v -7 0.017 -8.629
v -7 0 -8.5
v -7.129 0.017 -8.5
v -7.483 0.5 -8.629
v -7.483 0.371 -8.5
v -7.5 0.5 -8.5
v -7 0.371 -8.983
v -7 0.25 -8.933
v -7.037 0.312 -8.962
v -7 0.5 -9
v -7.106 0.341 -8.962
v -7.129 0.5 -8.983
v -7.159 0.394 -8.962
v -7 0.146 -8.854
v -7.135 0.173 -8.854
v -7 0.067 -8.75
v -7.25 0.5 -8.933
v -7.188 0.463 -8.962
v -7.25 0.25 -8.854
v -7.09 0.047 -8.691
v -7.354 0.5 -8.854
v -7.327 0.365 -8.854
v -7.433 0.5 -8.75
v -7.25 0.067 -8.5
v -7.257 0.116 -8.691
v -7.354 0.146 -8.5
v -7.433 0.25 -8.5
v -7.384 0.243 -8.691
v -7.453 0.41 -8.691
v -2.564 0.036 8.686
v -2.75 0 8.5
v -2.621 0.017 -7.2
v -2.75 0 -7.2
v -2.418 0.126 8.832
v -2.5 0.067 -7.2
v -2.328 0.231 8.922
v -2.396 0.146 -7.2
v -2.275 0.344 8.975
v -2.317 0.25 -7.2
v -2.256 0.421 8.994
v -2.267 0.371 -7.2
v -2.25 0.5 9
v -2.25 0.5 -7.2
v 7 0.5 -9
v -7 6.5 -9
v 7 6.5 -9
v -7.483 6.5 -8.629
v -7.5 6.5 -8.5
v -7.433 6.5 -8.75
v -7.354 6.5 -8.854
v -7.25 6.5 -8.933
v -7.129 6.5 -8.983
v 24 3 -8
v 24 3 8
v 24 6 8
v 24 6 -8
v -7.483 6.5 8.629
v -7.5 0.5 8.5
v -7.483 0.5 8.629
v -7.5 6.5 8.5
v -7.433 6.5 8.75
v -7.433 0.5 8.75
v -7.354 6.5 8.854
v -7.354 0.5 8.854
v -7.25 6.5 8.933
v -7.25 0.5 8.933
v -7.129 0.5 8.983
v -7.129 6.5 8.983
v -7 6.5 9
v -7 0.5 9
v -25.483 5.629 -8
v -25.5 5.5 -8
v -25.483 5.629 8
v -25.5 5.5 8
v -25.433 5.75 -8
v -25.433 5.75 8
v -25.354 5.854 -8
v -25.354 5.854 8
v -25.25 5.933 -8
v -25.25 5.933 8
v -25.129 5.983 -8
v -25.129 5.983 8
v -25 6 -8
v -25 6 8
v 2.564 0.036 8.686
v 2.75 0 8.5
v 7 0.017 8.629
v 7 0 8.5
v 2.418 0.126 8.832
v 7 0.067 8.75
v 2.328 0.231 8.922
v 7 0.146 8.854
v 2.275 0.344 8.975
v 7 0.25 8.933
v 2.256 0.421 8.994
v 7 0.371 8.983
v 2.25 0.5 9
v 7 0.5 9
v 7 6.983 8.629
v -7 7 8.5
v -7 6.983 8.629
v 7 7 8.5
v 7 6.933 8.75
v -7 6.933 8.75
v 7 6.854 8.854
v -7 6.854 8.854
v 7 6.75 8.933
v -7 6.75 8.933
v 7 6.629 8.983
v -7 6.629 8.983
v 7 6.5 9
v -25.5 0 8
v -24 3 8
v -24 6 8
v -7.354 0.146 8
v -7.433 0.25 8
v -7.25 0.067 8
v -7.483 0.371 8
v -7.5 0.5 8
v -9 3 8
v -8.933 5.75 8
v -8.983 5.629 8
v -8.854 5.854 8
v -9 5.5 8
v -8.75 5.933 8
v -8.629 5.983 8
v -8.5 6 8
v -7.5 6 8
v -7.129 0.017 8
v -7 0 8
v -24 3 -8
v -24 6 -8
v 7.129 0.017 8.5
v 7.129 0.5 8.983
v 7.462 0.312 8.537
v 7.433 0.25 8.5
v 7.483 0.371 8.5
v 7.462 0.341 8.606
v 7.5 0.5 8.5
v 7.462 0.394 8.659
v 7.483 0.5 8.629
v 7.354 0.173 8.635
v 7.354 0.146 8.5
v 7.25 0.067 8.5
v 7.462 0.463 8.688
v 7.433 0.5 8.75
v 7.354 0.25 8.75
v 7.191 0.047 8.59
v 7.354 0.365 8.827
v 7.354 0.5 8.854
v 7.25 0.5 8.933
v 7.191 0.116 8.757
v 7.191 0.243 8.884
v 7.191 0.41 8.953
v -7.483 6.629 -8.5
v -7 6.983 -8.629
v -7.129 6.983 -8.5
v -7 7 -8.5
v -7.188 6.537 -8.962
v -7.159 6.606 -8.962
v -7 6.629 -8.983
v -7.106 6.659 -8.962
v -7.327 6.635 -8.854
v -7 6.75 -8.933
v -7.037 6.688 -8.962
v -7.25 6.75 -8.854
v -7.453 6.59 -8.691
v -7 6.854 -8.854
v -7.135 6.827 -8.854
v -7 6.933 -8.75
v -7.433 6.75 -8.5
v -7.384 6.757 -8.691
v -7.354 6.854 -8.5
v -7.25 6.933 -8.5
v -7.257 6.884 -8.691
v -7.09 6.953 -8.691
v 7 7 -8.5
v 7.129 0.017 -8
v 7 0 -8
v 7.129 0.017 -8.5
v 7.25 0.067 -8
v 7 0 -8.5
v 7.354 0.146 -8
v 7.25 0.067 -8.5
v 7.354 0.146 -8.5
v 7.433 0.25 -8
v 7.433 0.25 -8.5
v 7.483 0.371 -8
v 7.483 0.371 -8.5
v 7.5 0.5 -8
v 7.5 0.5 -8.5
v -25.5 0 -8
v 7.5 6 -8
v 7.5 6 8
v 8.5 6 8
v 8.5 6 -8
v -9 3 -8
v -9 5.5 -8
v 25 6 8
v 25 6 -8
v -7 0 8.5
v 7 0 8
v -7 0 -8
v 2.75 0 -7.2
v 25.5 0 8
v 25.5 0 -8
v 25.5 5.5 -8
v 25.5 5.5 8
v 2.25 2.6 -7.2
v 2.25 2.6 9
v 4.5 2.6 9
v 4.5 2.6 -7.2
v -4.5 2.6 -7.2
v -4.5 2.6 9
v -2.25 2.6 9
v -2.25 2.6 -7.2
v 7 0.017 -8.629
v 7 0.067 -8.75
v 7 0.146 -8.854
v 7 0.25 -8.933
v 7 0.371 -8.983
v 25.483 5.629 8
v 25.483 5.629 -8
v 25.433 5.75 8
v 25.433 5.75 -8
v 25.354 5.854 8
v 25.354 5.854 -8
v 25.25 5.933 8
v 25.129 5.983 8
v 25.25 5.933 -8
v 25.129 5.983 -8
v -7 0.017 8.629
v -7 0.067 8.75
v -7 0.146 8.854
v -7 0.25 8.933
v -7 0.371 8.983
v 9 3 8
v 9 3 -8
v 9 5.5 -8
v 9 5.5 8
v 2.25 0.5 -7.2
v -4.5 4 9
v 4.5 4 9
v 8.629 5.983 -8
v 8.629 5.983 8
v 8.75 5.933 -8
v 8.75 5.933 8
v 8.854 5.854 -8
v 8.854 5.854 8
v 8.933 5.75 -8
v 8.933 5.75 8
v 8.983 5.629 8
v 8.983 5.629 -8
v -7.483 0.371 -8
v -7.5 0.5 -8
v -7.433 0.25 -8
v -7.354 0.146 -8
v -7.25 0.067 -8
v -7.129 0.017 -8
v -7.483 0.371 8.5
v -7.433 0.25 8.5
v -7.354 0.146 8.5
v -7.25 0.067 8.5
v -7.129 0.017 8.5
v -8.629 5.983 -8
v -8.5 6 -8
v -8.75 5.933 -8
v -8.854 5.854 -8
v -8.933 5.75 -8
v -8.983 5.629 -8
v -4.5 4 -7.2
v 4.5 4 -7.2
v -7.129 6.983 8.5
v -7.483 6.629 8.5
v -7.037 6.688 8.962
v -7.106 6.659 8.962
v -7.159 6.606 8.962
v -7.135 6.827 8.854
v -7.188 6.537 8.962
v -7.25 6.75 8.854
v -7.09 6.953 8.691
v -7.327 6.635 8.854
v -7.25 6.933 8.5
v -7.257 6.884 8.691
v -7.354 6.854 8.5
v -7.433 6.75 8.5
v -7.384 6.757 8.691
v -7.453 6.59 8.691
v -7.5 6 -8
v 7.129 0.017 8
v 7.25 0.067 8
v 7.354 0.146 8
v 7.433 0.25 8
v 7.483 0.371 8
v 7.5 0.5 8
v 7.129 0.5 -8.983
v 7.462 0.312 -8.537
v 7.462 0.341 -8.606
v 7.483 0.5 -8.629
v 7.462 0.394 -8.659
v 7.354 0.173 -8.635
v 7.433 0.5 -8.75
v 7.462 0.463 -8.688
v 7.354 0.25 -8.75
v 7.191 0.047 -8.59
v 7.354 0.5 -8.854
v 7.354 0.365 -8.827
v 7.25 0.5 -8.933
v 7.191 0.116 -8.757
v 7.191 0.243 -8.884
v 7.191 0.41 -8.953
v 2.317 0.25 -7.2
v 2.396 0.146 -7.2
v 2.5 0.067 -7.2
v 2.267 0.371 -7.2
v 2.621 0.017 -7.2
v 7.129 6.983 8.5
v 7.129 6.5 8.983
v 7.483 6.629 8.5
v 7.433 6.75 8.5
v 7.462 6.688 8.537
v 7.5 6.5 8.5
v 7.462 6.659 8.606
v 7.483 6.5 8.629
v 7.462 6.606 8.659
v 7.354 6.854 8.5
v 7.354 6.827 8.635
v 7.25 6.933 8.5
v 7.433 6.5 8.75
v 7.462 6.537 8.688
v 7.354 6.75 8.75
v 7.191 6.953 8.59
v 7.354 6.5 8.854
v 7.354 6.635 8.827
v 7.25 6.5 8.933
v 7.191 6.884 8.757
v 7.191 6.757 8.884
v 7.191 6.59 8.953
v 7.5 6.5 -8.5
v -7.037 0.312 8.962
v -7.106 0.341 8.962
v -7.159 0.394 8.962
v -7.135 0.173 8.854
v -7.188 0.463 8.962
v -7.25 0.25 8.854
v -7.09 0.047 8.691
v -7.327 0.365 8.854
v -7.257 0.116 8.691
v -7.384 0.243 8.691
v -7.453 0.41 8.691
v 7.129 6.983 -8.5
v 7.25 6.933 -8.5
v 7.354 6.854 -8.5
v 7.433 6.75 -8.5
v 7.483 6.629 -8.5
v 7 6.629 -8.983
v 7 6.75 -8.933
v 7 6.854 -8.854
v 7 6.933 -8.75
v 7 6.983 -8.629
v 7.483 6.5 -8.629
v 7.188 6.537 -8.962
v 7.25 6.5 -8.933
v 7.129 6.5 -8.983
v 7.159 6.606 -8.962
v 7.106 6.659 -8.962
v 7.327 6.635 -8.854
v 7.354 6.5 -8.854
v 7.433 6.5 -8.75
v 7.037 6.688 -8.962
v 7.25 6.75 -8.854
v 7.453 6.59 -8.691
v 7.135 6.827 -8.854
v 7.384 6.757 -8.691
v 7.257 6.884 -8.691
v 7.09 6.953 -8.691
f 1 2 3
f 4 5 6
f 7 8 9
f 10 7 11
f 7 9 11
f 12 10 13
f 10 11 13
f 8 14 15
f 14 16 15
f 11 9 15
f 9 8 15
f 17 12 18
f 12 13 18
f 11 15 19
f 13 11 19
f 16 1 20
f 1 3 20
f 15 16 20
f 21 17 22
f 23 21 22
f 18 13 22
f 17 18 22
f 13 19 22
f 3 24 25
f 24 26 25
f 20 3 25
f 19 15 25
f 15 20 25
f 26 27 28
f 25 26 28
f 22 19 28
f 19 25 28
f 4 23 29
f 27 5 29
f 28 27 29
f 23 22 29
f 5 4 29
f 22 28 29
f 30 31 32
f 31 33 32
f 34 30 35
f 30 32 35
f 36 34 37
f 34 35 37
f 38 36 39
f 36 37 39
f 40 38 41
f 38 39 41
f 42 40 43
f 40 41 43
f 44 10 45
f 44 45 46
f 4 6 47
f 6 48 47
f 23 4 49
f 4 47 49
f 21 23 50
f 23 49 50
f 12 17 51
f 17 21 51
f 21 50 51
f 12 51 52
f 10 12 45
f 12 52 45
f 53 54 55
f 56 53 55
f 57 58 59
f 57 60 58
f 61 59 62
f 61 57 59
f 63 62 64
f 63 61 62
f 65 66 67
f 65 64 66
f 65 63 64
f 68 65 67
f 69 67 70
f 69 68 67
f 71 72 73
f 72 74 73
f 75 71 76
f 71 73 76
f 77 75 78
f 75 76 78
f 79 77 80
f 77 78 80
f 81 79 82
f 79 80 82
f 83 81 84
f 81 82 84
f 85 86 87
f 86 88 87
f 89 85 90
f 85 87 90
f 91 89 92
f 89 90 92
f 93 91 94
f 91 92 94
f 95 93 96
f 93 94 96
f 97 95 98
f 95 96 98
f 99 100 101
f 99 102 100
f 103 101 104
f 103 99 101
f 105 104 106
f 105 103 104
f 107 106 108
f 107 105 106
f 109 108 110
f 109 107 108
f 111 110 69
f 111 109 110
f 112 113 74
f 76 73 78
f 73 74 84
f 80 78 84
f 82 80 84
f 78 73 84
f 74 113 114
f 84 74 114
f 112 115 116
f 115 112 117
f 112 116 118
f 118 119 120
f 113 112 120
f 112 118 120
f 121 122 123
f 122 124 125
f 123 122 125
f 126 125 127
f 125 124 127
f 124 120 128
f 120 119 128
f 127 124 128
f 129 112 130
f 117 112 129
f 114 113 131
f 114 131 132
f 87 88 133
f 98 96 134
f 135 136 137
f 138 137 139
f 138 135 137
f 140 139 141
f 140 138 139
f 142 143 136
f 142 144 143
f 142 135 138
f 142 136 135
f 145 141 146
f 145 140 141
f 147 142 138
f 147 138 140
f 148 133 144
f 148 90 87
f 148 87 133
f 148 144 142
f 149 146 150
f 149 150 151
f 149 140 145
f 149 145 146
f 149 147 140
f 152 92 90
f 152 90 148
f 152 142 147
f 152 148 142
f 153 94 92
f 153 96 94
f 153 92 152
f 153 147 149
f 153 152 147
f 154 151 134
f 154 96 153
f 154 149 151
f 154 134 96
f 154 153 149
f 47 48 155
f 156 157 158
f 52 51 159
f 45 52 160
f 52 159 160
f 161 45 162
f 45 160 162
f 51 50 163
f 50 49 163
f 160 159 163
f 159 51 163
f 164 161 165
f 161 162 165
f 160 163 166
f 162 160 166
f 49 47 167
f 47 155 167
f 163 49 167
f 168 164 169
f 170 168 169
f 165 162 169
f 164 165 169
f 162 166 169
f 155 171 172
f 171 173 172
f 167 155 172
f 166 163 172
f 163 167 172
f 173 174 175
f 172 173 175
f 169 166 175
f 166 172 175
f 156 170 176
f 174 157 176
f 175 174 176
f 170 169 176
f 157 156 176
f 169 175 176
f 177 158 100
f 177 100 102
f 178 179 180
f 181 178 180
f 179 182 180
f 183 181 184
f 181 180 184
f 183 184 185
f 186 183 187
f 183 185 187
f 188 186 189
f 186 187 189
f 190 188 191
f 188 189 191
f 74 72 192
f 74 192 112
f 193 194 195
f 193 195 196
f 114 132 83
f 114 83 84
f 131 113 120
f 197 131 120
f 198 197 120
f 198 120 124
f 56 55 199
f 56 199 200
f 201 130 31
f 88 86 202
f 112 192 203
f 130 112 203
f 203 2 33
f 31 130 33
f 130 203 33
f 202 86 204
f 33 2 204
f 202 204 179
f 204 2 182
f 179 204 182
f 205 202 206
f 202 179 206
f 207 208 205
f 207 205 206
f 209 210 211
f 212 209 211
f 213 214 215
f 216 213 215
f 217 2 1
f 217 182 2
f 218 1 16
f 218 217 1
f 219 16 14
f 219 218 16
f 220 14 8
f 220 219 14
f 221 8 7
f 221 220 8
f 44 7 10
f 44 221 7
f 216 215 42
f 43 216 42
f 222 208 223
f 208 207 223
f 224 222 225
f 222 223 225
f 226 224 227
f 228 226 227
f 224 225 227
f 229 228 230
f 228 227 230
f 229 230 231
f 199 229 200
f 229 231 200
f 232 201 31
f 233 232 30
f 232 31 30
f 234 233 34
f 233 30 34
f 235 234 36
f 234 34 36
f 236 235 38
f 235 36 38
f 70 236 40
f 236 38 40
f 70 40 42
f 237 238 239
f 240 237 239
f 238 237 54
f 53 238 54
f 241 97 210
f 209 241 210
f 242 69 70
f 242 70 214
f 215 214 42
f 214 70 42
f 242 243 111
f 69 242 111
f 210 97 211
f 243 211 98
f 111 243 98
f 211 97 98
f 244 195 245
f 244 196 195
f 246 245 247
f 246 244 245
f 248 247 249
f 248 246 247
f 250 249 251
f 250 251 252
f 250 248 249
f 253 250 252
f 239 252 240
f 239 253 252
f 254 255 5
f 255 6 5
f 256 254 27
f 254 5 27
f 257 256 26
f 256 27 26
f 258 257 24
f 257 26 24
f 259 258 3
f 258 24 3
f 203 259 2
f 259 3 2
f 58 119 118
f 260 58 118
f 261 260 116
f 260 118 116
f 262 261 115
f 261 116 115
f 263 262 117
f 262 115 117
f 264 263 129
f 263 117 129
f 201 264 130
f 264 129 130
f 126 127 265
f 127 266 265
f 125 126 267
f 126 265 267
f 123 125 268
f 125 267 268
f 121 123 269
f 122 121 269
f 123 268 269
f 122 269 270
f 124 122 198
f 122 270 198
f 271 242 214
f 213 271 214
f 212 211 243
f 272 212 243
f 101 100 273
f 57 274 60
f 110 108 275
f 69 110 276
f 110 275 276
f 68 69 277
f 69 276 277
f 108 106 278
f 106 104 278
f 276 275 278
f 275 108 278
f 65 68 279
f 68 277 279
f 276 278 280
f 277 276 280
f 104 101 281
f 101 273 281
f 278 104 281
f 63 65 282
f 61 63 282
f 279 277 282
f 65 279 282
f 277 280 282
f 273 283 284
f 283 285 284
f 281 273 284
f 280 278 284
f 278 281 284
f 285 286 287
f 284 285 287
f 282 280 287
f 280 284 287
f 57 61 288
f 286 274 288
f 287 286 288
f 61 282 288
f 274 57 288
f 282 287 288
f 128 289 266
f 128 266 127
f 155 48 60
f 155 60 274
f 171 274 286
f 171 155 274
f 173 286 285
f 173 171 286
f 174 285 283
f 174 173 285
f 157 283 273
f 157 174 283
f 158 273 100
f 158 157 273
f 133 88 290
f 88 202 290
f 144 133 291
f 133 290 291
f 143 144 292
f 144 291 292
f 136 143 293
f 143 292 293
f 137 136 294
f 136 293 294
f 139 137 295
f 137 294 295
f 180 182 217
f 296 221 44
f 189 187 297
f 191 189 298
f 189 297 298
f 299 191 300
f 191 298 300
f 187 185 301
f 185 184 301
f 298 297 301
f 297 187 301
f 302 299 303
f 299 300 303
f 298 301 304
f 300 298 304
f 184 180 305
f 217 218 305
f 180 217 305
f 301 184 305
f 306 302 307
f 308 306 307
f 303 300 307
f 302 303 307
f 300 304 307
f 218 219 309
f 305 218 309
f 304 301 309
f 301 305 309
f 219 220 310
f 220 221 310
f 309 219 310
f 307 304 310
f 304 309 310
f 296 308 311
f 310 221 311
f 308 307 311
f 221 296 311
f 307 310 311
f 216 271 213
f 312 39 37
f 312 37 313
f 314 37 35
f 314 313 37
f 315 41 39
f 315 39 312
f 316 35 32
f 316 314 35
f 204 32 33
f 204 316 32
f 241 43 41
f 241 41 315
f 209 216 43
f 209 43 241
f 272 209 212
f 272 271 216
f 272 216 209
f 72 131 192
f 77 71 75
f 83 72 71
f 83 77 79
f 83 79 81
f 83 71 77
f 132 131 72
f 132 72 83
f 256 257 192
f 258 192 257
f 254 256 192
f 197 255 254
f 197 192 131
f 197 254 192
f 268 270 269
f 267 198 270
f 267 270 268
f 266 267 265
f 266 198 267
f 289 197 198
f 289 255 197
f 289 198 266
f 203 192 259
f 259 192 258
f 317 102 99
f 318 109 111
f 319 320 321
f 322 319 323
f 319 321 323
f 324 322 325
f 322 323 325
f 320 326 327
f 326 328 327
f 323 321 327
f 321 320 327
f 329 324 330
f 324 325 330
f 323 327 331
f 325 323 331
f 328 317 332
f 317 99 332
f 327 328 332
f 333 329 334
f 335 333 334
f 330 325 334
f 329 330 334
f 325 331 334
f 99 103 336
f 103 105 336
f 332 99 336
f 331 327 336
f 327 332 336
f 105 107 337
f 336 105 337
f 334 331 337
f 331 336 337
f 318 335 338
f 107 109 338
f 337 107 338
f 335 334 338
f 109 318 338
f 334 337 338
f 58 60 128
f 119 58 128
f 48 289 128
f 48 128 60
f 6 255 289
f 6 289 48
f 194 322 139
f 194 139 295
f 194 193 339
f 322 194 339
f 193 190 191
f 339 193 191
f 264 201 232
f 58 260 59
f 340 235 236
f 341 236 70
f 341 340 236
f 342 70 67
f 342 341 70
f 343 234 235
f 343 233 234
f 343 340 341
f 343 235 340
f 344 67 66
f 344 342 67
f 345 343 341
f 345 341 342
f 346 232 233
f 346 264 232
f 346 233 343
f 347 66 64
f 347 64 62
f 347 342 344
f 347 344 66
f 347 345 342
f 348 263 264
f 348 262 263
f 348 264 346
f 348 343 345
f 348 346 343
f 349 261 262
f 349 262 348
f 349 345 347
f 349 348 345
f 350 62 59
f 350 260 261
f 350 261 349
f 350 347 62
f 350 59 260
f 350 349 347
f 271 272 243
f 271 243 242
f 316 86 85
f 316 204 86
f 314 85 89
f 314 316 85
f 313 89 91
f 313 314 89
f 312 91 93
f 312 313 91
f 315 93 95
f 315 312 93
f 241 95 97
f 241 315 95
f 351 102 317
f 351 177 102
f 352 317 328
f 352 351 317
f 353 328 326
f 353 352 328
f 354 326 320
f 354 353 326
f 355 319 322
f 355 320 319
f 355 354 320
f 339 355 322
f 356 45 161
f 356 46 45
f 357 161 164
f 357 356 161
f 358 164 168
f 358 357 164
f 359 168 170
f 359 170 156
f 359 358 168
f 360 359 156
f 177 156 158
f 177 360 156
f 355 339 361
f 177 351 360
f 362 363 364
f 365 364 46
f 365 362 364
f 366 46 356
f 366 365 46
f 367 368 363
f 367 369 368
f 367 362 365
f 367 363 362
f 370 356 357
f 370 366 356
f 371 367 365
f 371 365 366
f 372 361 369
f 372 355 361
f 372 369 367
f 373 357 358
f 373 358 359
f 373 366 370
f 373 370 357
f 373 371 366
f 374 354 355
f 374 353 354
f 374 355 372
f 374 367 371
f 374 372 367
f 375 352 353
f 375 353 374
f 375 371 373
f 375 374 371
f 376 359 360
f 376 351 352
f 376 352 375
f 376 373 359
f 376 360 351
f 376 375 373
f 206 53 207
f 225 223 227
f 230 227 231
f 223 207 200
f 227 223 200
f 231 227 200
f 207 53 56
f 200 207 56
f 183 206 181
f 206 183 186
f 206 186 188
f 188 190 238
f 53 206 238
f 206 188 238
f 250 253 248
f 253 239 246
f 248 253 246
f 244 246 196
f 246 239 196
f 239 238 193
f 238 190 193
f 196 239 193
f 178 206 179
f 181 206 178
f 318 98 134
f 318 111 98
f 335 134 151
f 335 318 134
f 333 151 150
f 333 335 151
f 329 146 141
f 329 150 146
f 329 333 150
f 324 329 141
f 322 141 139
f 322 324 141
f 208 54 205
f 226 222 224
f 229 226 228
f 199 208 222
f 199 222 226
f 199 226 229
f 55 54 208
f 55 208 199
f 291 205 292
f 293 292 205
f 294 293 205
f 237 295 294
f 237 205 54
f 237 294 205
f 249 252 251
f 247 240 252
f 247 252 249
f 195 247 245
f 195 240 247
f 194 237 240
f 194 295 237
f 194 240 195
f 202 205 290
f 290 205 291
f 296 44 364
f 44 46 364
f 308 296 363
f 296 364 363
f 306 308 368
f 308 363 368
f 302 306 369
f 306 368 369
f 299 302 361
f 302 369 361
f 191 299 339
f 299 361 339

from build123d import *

# Parameters (mm, degrees)
SKETCH1_W           = 15
SKETCH1_H           = 18
BOSS_EXTRUDE1_DEPTH = 7
CUT_EXTRUDE1_DEPTH  = 16.2
SKETCH9_W           = 16
SKETCH9_H           = 6
BOSS_EXTRUDE2_DEPTH = 18
SKETCH13_W          = 16
SKETCH13_H          = 6
BOSS_EXTRUDE3_DEPTH = 18
SKETCH14_W          = 15
SKETCH14_H          = 3
CUT_EXTRUDE5_DEPTH  = 32.55
FILLET1_R           = 0.5


with BuildPart() as part:
    # Sketch1 → Boss-Extrude1 (new body)
    with BuildSketch(Plane(origin=(0, 0, 0), x_dir=(1, 0, 0), z_dir=(0, 1, 0))):
        Rectangle(SKETCH1_W, SKETCH1_H)
    extrude(amount=BOSS_EXTRUDE1_DEPTH)

    # Sketch2 → Cut-Extrude1 (cut)
    with BuildSketch(Plane.XY.offset(9)):
        Polygon((-2.25, 2.6), (-2.25, 0), (2.25, 0), (2.25, 2.6), (4.5, 2.6), (4.5, 4), (-4.5, 4), (-4.5, 2.6), align=None)
    extrude(amount=-CUT_EXTRUDE1_DEPTH, mode=Mode.SUBTRACT)

    # Sketch9 → Boss-Extrude2 (add)
    with BuildSketch(Plane.ZY.offset(7.5)):
        with Locations((0, 3)):
            Rectangle(SKETCH9_W, SKETCH9_H)
    extrude(amount=BOSS_EXTRUDE2_DEPTH)

    # Sketch13 → Boss-Extrude3 (add)
    with BuildSketch(Plane(origin=(7.5, 0, 0), x_dir=(0, 0, -1), z_dir=(1, 0, 0))):
        with Locations((0, 3)):
            Rectangle(SKETCH13_W, SKETCH13_H)
    extrude(amount=BOSS_EXTRUDE3_DEPTH)

    # Sketch14 → Cut-Extrude5 (cut)
    with BuildSketch(Plane.XY.offset(9)):
        with Locations((16.5, 4.5)):
            Rectangle(SKETCH14_W, SKETCH14_H)
        with Locations((-16.5, 4.5)):
            Rectangle(SKETCH14_W, SKETCH14_H)
    extrude(amount=-CUT_EXTRUDE5_DEPTH, mode=Mode.SUBTRACT)

    # Fillet1
    fillet1_edges = [part.edges().sort_by_distance(p)[0] for p in [
        (-7.5, 7, 0),
        (4.875, 0, 9),
        (0, 7, 9),
        (-2.25, 0, 0.9),
        (2.25, 0, 0.9),
        (-7.5, 0, 8.5),
        (-25.5, 6, 0),
        (7.5, 7, 0),
        (-4.875, 0, 9),
        (-7.5, 0, -8.5),
        (0, 0, -9),
        (7.5, 0, -8.5),
        (7.5, 0, 8.5),
        (25.5, 6, 0),
        (7.5, 3.5, 9),
        (-7.5, 3.5, 9),
        (-7.5, 3.5, -9),
        (9, 6, 0),
        (7.5, 3.5, -9),
        (0, 7, -9),
        (-9, 6, 0),
    ]]
    fillet(fillet1_edges, radius=FILLET1_R)


solid = part.part
